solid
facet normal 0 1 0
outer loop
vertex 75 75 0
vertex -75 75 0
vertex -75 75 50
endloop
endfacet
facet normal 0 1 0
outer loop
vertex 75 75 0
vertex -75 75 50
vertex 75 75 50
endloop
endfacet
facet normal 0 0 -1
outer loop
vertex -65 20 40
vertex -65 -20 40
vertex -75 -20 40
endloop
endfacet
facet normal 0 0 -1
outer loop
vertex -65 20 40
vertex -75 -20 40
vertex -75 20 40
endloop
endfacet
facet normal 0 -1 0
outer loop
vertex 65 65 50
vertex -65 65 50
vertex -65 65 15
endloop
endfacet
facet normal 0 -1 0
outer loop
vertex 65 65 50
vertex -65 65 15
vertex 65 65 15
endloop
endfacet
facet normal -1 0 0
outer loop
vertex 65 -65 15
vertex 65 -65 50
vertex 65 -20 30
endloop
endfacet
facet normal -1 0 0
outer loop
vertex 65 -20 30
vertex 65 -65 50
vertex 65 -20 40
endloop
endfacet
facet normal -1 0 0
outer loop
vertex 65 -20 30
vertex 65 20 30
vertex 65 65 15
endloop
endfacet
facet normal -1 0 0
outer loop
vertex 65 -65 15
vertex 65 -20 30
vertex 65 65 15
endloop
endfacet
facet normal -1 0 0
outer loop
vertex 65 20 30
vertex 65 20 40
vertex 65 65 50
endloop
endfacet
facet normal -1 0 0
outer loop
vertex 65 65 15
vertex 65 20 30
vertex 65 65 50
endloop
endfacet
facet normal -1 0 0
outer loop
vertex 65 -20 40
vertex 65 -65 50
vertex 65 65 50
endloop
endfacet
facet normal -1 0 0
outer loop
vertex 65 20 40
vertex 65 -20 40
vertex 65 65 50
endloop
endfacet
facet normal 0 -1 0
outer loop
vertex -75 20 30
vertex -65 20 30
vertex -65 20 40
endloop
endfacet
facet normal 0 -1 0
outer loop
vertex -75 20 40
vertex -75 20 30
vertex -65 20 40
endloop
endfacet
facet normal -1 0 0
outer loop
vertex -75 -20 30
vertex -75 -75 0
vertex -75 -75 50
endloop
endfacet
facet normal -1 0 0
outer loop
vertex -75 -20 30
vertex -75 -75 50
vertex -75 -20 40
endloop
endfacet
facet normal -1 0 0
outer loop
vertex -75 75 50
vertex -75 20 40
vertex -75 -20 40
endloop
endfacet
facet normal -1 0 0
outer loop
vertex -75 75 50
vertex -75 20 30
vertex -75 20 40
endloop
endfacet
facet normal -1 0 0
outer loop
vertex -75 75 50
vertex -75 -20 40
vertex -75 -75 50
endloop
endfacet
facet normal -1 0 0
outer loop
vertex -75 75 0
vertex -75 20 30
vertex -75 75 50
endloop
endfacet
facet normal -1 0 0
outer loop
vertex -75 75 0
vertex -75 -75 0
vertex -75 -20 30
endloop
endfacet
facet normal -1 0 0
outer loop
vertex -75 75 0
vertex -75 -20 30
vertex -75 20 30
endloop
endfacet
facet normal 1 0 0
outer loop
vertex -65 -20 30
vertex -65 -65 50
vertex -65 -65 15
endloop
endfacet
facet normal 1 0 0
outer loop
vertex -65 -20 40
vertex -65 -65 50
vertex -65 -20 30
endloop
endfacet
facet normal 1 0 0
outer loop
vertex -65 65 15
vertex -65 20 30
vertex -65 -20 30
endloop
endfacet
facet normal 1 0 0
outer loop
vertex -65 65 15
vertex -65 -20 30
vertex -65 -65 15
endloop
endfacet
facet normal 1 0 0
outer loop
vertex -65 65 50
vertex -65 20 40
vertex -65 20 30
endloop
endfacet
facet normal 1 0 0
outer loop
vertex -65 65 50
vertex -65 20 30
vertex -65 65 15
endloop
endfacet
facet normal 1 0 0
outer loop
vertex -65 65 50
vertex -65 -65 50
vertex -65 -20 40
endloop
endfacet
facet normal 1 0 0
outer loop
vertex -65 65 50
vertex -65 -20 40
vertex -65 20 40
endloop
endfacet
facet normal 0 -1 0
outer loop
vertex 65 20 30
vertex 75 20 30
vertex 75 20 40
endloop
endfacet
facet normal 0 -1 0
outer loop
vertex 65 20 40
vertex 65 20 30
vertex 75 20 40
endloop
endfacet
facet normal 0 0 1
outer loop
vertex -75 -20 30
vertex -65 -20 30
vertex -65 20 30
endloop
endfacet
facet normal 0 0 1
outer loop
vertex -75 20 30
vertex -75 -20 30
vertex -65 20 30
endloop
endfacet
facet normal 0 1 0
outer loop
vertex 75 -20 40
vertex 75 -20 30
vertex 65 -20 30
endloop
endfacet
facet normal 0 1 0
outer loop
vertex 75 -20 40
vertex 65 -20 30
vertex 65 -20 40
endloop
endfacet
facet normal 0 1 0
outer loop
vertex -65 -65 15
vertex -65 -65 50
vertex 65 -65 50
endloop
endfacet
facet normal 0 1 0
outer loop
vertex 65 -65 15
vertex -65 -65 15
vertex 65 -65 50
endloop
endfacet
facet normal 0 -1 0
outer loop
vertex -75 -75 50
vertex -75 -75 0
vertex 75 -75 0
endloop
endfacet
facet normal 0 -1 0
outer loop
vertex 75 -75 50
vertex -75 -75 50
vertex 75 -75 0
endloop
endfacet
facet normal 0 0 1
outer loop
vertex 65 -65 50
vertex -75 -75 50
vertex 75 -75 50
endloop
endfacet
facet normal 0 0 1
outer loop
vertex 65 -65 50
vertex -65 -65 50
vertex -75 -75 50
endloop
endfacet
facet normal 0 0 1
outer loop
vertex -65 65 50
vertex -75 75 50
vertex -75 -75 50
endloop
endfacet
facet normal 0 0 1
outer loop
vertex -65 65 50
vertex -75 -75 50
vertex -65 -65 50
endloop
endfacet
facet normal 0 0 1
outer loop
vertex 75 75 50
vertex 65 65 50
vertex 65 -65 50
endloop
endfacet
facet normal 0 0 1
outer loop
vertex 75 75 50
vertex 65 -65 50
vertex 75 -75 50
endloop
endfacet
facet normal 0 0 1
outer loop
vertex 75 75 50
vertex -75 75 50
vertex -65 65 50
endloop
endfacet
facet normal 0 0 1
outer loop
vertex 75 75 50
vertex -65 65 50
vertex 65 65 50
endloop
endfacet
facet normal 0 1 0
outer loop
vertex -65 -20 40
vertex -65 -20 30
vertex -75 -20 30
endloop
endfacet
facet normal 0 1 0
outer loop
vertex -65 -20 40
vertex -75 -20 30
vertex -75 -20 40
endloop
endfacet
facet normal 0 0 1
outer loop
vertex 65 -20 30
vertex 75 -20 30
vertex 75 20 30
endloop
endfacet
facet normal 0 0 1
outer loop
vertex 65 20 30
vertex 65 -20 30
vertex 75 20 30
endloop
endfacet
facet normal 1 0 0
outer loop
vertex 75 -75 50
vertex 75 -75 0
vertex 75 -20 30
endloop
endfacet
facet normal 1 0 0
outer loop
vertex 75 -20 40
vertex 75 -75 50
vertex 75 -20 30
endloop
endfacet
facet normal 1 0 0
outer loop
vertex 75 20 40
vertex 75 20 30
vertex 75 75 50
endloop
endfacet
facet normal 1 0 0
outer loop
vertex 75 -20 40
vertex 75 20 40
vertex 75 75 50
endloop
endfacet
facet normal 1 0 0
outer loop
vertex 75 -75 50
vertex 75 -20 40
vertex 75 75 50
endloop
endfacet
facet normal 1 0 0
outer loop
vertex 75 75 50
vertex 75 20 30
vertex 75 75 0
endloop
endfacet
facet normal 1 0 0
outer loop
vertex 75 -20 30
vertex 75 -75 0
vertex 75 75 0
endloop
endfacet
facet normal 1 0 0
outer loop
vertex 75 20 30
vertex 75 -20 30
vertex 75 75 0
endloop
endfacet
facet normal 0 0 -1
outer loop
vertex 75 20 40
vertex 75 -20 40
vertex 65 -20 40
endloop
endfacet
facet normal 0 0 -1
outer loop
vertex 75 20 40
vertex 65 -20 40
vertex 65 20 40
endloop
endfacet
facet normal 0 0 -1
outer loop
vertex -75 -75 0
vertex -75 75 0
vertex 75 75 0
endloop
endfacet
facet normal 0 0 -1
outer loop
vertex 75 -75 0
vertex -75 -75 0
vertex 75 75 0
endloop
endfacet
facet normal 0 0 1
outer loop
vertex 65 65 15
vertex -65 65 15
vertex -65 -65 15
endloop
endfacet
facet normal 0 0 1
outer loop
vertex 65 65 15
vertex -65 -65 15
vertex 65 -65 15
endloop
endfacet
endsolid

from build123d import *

# Parameters (mm, degrees)
F0_W     = 150
F0_H     = 150
F1_DEPTH = 50
F2_W     = 130
F2_H     = 130
F3_DEPTH = 35
F4_W     = 40
F4_H     = 10
F5_DEPTH = 150.001


with BuildPart() as f1:
    # F0 (on Top) → F1 (new body)
    with BuildSketch(Plane.XY):
        Rectangle(F0_W, F0_H)
    extrude(amount=F1_DEPTH)

    # F2 (on face) → F3 (cut)
    with BuildSketch(Plane.XY.offset(50)):
        Rectangle(F2_W, F2_H)
    extrude(amount=-F3_DEPTH, mode=Mode.SUBTRACT)

    # F4 (on face) → F5 (cut, through all)
    with BuildSketch(Plane.YZ.offset(75)):
        with Locations((0, 35)):
            Rectangle(F4_W, F4_H)
    extrude(amount=-F5_DEPTH, mode=Mode.SUBTRACT)


solid = f1.part
